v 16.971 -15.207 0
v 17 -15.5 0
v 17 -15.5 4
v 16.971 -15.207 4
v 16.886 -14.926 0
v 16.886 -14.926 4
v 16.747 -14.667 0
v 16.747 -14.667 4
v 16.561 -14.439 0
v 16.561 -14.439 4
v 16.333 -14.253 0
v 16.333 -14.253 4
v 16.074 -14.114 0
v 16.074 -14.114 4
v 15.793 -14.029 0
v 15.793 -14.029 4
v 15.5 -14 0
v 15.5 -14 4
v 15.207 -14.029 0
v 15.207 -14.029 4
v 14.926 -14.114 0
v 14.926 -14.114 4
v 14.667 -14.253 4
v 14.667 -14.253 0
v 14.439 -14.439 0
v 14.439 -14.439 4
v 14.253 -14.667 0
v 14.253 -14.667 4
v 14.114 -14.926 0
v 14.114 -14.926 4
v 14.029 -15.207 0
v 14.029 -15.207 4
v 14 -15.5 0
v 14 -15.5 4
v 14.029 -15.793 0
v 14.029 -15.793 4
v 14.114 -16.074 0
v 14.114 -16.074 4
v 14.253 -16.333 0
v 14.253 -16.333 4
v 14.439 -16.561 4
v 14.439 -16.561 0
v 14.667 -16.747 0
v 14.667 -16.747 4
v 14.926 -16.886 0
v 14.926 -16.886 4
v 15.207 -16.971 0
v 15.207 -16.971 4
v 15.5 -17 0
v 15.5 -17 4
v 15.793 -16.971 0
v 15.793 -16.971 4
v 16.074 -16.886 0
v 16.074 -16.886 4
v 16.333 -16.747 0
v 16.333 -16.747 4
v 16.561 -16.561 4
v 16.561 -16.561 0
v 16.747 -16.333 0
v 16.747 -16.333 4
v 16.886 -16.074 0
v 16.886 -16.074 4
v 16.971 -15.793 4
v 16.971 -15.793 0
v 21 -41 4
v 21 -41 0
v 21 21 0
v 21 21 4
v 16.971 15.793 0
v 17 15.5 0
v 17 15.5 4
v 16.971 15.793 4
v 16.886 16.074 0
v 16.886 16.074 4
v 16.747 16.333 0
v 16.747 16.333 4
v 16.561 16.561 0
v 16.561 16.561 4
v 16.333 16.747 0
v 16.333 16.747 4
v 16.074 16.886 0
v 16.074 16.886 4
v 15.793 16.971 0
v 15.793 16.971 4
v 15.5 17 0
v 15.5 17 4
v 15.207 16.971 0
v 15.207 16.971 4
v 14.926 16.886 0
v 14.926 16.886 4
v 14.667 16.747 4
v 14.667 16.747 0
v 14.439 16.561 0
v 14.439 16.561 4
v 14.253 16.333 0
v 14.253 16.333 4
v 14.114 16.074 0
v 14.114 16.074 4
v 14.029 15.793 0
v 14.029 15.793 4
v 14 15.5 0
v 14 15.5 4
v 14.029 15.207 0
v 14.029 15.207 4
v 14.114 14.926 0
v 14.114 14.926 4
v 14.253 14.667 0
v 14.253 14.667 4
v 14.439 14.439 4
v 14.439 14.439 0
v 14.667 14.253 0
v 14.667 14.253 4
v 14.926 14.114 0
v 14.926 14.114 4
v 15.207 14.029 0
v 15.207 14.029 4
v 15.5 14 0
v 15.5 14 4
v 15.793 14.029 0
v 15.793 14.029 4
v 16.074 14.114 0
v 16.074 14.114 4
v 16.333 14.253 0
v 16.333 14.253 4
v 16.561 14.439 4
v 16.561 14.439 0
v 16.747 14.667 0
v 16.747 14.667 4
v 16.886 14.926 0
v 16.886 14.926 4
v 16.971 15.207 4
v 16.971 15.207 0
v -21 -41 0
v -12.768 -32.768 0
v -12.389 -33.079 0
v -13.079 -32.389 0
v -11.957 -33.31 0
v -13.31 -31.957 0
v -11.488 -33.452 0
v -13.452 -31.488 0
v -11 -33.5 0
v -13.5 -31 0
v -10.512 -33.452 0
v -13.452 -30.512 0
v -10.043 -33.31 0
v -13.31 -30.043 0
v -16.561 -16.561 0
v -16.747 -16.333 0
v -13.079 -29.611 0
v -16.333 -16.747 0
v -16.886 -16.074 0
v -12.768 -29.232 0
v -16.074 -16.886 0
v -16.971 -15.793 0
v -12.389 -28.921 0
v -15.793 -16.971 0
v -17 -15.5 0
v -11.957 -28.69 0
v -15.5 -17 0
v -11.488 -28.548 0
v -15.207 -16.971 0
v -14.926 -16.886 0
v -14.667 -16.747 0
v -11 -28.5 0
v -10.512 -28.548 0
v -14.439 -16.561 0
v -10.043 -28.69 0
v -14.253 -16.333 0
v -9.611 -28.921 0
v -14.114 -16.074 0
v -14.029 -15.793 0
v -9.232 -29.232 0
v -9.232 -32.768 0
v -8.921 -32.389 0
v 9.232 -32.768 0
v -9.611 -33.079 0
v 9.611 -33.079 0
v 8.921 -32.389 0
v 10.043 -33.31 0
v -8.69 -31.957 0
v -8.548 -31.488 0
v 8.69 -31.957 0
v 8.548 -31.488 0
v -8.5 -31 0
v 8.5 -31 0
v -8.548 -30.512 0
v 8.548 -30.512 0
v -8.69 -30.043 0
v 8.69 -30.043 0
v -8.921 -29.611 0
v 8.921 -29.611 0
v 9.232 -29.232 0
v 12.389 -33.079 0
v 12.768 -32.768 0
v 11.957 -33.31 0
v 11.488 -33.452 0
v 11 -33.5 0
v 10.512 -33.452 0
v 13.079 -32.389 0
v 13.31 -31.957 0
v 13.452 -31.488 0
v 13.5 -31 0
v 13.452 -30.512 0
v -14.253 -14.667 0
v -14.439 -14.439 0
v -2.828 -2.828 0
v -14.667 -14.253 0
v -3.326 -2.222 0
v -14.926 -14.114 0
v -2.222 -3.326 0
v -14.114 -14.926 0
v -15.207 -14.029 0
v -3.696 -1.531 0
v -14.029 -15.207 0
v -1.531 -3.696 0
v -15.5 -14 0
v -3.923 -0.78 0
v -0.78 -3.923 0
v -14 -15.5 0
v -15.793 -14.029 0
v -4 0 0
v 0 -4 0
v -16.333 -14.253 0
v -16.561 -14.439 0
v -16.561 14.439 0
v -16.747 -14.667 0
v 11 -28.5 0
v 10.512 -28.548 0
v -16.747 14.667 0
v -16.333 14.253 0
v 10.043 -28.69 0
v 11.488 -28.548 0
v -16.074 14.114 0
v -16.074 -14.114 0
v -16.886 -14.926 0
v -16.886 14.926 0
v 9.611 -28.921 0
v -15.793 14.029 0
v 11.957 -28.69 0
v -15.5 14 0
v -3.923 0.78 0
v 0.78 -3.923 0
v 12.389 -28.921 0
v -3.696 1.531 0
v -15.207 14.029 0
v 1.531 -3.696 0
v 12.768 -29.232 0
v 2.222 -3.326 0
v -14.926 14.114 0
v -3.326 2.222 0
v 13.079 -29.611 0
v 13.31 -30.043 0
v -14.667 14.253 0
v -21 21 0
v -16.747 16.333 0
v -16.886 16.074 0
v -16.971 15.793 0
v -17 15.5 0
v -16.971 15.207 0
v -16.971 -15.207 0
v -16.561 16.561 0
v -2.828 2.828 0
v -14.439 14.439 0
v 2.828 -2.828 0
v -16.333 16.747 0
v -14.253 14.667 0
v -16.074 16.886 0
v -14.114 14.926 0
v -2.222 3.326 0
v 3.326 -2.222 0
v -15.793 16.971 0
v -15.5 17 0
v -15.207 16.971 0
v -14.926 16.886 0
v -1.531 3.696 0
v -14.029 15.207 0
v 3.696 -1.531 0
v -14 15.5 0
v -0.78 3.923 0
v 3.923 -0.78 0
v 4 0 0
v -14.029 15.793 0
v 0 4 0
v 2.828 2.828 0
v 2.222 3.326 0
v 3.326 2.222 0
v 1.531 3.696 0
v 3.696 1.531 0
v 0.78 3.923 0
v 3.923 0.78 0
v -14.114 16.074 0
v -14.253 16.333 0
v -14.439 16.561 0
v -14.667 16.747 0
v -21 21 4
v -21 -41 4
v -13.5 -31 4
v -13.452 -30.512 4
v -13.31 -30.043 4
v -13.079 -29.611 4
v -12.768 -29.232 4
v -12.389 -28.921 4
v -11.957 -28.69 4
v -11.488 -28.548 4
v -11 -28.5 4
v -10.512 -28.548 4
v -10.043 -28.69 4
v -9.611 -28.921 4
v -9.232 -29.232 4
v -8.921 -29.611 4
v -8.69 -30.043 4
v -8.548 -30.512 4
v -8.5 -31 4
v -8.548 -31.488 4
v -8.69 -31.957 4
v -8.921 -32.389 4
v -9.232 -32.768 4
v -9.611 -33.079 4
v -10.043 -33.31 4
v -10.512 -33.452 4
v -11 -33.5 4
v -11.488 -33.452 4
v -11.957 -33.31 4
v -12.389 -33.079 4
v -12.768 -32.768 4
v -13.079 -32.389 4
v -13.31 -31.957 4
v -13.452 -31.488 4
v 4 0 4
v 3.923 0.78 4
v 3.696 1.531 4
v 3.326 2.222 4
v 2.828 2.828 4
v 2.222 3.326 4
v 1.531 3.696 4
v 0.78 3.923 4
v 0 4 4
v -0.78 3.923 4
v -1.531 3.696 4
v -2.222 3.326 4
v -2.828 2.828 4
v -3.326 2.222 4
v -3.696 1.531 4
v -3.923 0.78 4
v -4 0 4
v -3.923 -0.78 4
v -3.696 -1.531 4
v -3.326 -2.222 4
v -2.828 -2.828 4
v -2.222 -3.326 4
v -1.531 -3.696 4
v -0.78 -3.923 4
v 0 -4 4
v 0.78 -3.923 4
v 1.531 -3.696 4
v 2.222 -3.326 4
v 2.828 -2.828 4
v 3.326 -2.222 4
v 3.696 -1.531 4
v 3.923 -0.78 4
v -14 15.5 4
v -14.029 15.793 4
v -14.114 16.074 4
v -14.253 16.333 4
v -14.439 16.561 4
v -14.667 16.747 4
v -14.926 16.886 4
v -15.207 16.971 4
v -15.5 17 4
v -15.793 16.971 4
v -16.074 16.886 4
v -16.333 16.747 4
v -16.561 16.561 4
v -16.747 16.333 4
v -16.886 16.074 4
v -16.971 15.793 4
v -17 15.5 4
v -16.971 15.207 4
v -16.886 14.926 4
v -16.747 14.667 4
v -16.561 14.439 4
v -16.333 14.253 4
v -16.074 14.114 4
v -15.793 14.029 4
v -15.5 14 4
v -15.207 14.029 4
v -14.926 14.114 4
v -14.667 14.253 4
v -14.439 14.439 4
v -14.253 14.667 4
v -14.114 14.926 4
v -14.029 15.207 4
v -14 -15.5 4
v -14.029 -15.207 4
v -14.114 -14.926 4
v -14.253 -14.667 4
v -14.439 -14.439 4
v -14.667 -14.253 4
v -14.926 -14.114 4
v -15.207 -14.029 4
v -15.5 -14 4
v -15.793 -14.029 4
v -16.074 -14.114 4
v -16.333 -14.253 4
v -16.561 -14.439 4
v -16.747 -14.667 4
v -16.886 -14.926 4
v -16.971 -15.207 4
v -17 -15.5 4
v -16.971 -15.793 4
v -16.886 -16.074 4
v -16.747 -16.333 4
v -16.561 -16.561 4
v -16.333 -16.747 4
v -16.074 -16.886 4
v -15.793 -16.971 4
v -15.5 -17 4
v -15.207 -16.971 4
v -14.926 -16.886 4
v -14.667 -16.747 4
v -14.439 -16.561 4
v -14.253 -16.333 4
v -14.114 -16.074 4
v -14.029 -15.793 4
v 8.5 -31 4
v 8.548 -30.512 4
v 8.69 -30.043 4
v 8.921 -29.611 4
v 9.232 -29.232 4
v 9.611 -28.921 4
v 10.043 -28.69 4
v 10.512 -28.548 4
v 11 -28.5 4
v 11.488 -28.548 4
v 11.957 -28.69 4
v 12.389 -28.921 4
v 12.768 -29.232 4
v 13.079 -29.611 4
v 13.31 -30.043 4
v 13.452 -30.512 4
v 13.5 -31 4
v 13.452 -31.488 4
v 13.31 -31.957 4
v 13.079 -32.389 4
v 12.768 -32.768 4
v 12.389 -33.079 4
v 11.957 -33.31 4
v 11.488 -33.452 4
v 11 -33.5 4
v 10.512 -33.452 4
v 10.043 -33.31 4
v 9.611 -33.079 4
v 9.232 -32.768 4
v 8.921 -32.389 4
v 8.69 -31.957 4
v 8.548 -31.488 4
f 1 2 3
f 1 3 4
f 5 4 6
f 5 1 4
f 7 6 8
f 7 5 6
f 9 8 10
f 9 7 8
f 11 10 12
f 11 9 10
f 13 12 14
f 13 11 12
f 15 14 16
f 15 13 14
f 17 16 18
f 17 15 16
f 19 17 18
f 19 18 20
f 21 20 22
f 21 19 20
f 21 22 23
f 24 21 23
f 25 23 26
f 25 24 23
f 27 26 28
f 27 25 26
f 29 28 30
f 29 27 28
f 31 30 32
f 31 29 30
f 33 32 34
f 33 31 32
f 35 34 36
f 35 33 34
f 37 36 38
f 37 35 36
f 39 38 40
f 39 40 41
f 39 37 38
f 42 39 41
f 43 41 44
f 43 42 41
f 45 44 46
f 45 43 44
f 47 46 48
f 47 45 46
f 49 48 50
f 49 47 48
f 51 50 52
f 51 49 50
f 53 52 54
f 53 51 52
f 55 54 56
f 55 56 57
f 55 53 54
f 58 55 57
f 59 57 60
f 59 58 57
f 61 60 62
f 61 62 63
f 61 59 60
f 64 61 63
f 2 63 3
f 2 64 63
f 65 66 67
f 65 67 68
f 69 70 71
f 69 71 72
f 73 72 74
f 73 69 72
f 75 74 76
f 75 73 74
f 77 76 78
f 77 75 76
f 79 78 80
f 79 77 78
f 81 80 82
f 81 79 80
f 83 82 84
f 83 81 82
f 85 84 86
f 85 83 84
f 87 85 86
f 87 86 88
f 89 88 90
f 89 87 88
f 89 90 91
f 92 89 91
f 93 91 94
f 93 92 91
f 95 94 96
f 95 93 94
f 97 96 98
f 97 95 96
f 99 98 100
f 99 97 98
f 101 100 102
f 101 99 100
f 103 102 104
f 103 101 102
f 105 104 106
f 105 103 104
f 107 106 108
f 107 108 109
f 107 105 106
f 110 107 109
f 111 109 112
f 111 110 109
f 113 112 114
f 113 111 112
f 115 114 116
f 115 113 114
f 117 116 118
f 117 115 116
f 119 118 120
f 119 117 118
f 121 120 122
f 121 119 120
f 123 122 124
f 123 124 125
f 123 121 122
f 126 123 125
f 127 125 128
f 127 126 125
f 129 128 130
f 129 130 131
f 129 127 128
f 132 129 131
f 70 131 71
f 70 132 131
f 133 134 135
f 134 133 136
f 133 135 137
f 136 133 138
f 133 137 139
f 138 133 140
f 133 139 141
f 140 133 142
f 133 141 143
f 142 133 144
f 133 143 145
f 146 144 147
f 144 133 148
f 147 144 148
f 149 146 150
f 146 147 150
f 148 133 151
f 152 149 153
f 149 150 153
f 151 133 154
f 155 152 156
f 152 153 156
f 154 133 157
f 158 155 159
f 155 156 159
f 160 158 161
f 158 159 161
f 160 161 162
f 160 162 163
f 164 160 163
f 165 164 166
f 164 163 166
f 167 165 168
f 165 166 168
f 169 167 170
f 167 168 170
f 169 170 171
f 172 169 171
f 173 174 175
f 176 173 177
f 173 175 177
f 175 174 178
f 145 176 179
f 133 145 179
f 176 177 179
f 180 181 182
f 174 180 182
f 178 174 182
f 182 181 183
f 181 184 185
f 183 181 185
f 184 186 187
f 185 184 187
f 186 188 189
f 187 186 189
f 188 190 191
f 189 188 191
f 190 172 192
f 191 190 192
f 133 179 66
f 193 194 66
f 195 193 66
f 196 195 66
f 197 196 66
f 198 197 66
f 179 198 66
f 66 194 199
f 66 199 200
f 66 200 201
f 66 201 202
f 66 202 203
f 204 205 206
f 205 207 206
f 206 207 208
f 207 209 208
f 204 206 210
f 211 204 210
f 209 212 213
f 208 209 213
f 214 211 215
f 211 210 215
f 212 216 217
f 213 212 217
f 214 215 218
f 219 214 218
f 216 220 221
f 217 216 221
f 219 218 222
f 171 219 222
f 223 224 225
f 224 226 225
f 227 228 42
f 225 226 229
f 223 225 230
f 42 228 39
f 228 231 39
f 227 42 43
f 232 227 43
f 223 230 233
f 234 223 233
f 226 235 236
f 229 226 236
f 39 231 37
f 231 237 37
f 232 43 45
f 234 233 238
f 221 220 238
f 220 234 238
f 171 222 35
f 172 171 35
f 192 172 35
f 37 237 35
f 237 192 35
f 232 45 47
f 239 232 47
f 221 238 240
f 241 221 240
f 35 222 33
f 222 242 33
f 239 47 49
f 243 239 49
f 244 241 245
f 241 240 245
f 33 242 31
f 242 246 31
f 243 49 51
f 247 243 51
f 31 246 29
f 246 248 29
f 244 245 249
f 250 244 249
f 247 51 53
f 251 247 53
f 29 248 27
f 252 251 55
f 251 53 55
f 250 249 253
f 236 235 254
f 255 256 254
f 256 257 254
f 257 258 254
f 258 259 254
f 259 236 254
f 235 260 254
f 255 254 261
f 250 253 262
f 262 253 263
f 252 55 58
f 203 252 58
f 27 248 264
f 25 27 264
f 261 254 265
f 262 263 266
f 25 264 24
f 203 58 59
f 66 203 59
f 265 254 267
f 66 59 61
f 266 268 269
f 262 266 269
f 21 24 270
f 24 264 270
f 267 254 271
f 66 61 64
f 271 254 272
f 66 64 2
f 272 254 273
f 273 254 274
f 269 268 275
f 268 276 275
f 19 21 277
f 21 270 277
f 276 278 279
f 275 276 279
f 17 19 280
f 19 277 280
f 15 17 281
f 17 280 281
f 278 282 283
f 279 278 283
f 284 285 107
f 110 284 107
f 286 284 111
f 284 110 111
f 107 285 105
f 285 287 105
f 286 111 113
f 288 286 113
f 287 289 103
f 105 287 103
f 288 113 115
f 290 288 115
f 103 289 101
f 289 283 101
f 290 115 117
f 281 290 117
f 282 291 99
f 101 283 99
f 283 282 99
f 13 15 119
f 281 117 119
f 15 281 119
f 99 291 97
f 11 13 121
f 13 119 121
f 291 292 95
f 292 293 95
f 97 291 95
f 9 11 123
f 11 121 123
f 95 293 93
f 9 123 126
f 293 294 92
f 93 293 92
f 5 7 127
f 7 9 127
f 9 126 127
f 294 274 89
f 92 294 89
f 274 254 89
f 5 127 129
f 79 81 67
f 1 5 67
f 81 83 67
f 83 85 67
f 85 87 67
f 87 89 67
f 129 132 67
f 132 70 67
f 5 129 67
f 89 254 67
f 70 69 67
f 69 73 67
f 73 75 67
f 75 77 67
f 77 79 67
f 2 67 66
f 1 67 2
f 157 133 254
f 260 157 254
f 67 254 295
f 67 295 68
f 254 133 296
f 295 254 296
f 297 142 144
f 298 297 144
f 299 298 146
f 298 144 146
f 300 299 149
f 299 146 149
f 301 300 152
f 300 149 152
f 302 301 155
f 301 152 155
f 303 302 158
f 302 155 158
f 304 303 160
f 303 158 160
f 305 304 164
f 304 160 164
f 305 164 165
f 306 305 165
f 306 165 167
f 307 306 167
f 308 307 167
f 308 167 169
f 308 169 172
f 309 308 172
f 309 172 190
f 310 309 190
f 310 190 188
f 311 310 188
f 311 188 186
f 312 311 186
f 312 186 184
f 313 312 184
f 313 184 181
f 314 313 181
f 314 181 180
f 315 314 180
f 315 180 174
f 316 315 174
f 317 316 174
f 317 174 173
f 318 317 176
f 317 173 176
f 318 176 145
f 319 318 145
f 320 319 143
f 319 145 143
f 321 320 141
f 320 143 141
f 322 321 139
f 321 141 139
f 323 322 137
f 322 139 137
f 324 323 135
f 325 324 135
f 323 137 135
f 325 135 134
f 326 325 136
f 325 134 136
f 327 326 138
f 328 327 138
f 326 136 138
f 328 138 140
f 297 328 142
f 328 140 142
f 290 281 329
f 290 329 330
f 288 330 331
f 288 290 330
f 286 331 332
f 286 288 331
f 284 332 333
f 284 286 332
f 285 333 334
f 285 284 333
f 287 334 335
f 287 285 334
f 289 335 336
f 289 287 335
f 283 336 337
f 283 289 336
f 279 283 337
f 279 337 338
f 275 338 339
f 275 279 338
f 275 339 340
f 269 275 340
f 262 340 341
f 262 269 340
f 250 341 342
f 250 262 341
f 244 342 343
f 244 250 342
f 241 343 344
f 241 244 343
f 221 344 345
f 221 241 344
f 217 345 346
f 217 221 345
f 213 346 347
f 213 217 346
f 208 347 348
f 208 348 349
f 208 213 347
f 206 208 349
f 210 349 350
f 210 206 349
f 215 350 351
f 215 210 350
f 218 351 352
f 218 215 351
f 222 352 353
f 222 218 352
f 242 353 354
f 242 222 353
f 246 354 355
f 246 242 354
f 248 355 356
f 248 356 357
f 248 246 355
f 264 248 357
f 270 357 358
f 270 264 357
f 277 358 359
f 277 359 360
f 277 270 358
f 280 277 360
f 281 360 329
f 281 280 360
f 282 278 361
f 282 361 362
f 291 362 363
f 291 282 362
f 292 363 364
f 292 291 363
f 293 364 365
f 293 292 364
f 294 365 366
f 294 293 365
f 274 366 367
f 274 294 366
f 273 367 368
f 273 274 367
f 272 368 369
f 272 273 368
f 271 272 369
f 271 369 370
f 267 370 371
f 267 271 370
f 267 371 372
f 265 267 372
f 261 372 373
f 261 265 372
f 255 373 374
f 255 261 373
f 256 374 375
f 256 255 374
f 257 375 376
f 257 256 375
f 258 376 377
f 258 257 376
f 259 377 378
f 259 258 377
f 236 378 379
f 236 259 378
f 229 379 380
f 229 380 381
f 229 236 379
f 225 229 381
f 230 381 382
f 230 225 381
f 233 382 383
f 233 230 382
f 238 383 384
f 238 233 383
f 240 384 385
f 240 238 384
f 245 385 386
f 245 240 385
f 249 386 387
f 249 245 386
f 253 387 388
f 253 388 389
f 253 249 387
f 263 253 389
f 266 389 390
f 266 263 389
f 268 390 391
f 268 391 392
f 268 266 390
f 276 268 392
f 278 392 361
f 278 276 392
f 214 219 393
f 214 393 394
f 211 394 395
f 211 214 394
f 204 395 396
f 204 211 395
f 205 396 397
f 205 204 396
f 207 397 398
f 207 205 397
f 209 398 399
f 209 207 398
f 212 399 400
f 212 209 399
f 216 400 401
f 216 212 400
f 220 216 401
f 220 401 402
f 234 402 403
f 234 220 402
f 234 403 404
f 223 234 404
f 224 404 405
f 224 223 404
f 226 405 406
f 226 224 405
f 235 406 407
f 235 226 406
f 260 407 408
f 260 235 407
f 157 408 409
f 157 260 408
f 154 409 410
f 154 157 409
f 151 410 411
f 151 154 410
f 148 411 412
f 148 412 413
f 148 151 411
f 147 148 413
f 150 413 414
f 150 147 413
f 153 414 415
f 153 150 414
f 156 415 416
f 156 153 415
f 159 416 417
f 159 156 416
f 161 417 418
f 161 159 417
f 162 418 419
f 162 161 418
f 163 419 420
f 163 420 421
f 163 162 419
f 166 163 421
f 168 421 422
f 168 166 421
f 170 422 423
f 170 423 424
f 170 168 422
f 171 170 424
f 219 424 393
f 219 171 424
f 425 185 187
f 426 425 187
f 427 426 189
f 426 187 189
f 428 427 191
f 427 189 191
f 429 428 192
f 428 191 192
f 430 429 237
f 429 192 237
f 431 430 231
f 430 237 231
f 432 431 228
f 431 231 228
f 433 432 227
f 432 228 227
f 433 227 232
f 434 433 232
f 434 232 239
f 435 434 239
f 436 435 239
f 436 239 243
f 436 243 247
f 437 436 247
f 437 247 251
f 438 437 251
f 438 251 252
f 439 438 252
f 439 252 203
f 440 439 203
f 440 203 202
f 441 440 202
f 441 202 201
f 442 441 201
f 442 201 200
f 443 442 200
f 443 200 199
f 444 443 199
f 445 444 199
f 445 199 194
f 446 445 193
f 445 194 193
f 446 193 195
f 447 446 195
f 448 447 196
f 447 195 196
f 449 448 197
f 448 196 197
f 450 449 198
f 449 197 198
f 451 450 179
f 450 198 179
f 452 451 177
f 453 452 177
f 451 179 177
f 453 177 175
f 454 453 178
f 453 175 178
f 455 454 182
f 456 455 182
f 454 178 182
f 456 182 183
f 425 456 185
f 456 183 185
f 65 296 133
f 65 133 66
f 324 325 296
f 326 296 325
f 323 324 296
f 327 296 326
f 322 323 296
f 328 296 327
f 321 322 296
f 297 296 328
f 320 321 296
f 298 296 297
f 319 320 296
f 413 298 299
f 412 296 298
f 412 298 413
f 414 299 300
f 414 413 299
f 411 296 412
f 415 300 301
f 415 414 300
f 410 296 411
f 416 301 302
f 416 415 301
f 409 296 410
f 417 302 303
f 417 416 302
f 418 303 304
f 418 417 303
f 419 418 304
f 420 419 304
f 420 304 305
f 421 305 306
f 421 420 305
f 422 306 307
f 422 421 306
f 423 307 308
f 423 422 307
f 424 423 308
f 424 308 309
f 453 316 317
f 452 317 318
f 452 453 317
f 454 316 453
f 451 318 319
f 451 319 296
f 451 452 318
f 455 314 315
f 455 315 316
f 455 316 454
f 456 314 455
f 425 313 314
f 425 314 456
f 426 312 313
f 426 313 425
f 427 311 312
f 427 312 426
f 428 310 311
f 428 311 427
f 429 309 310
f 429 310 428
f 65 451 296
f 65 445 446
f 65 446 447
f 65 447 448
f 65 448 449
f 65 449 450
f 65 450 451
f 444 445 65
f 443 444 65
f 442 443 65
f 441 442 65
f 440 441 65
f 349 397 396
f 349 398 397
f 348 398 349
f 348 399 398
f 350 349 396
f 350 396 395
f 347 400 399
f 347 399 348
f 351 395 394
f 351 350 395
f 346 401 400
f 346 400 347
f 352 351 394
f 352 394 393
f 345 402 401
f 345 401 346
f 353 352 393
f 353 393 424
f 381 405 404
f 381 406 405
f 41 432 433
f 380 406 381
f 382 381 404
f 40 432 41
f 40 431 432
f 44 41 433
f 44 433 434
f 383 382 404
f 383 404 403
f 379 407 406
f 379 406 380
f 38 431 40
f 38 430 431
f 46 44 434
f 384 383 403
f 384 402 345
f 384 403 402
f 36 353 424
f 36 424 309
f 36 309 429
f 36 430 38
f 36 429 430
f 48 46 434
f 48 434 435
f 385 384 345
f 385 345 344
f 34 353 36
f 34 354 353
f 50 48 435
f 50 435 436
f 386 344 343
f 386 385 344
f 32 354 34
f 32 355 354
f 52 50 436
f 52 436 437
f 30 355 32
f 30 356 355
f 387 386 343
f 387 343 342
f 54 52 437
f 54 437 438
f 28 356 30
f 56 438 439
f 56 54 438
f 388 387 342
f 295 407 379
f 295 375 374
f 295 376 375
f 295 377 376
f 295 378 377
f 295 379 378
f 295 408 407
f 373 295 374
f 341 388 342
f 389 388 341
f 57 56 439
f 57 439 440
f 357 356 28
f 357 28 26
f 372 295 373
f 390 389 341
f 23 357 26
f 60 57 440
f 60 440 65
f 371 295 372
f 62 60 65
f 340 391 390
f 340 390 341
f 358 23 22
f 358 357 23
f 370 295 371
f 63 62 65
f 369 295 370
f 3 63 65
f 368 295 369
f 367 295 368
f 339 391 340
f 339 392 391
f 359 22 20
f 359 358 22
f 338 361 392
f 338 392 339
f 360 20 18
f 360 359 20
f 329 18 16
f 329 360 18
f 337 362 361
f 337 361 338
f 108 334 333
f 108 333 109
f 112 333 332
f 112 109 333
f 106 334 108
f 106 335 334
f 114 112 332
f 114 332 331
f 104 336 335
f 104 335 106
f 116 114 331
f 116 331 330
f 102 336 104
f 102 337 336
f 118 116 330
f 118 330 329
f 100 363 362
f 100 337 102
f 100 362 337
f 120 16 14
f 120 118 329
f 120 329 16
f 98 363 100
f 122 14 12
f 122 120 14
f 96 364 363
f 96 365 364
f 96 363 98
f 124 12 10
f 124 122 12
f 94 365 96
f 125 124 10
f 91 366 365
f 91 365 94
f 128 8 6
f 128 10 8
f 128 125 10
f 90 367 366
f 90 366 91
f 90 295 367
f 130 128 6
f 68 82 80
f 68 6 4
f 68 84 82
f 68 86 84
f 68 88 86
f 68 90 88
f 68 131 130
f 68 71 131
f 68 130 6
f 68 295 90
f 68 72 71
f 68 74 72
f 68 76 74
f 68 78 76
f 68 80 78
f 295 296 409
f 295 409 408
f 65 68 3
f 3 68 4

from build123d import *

# Parameters (mm, degrees)
SKETCH1_W           = 42
SKETCH1_H           = 42
SKETCH1_R           = 4
SKETCH1_R_2         = 1.5
BOSS_EXTRUDE1_DEPTH = 4
SKETCH3_W           = 42
SKETCH3_H           = 4
BOSS_EXTRUDE2_DEPTH = 20
SKETCH4_R           = 2.5
CUT_EXTRUDE2_DEPTH  = 20


with BuildPart() as part:
    # Sketch1 → Boss-Extrude1 (new body)
    with BuildSketch(Plane.XY):
        Rectangle(SKETCH1_W, SKETCH1_H)
        Circle(SKETCH1_R, mode=Mode.SUBTRACT)
        with Locations((-15.5, 15.5)):
            Circle(SKETCH1_R_2, mode=Mode.SUBTRACT)
        with Locations((15.5, 15.5)):
            Circle(SKETCH1_R_2, mode=Mode.SUBTRACT)
        with Locations((15.5, -15.5)):
            Circle(SKETCH1_R_2, mode=Mode.SUBTRACT)
        with Locations((-15.5, -15.5)):
            Circle(SKETCH1_R_2, mode=Mode.SUBTRACT)
    extrude(amount=BOSS_EXTRUDE1_DEPTH)

    # Sketch3 → Boss-Extrude2 (add)
    with BuildSketch(Plane.XZ.offset(21)):
        with Locations((0, 2)):
            Rectangle(SKETCH3_W, SKETCH3_H)
    extrude(amount=BOSS_EXTRUDE2_DEPTH)

    # Sketch4 → Cut-Extrude2 (cut)
    with BuildSketch(Plane(origin=(0, 0, 0), x_dir=(-1, 0, 0), z_dir=(0, 0, -1))):
        with Locations((-11, -31)):
            Circle(SKETCH4_R)
        with Locations((11, -31)):
            Circle(SKETCH4_R)
    extrude(amount=-CUT_EXTRUDE2_DEPTH, mode=Mode.SUBTRACT)


solid = part.part
